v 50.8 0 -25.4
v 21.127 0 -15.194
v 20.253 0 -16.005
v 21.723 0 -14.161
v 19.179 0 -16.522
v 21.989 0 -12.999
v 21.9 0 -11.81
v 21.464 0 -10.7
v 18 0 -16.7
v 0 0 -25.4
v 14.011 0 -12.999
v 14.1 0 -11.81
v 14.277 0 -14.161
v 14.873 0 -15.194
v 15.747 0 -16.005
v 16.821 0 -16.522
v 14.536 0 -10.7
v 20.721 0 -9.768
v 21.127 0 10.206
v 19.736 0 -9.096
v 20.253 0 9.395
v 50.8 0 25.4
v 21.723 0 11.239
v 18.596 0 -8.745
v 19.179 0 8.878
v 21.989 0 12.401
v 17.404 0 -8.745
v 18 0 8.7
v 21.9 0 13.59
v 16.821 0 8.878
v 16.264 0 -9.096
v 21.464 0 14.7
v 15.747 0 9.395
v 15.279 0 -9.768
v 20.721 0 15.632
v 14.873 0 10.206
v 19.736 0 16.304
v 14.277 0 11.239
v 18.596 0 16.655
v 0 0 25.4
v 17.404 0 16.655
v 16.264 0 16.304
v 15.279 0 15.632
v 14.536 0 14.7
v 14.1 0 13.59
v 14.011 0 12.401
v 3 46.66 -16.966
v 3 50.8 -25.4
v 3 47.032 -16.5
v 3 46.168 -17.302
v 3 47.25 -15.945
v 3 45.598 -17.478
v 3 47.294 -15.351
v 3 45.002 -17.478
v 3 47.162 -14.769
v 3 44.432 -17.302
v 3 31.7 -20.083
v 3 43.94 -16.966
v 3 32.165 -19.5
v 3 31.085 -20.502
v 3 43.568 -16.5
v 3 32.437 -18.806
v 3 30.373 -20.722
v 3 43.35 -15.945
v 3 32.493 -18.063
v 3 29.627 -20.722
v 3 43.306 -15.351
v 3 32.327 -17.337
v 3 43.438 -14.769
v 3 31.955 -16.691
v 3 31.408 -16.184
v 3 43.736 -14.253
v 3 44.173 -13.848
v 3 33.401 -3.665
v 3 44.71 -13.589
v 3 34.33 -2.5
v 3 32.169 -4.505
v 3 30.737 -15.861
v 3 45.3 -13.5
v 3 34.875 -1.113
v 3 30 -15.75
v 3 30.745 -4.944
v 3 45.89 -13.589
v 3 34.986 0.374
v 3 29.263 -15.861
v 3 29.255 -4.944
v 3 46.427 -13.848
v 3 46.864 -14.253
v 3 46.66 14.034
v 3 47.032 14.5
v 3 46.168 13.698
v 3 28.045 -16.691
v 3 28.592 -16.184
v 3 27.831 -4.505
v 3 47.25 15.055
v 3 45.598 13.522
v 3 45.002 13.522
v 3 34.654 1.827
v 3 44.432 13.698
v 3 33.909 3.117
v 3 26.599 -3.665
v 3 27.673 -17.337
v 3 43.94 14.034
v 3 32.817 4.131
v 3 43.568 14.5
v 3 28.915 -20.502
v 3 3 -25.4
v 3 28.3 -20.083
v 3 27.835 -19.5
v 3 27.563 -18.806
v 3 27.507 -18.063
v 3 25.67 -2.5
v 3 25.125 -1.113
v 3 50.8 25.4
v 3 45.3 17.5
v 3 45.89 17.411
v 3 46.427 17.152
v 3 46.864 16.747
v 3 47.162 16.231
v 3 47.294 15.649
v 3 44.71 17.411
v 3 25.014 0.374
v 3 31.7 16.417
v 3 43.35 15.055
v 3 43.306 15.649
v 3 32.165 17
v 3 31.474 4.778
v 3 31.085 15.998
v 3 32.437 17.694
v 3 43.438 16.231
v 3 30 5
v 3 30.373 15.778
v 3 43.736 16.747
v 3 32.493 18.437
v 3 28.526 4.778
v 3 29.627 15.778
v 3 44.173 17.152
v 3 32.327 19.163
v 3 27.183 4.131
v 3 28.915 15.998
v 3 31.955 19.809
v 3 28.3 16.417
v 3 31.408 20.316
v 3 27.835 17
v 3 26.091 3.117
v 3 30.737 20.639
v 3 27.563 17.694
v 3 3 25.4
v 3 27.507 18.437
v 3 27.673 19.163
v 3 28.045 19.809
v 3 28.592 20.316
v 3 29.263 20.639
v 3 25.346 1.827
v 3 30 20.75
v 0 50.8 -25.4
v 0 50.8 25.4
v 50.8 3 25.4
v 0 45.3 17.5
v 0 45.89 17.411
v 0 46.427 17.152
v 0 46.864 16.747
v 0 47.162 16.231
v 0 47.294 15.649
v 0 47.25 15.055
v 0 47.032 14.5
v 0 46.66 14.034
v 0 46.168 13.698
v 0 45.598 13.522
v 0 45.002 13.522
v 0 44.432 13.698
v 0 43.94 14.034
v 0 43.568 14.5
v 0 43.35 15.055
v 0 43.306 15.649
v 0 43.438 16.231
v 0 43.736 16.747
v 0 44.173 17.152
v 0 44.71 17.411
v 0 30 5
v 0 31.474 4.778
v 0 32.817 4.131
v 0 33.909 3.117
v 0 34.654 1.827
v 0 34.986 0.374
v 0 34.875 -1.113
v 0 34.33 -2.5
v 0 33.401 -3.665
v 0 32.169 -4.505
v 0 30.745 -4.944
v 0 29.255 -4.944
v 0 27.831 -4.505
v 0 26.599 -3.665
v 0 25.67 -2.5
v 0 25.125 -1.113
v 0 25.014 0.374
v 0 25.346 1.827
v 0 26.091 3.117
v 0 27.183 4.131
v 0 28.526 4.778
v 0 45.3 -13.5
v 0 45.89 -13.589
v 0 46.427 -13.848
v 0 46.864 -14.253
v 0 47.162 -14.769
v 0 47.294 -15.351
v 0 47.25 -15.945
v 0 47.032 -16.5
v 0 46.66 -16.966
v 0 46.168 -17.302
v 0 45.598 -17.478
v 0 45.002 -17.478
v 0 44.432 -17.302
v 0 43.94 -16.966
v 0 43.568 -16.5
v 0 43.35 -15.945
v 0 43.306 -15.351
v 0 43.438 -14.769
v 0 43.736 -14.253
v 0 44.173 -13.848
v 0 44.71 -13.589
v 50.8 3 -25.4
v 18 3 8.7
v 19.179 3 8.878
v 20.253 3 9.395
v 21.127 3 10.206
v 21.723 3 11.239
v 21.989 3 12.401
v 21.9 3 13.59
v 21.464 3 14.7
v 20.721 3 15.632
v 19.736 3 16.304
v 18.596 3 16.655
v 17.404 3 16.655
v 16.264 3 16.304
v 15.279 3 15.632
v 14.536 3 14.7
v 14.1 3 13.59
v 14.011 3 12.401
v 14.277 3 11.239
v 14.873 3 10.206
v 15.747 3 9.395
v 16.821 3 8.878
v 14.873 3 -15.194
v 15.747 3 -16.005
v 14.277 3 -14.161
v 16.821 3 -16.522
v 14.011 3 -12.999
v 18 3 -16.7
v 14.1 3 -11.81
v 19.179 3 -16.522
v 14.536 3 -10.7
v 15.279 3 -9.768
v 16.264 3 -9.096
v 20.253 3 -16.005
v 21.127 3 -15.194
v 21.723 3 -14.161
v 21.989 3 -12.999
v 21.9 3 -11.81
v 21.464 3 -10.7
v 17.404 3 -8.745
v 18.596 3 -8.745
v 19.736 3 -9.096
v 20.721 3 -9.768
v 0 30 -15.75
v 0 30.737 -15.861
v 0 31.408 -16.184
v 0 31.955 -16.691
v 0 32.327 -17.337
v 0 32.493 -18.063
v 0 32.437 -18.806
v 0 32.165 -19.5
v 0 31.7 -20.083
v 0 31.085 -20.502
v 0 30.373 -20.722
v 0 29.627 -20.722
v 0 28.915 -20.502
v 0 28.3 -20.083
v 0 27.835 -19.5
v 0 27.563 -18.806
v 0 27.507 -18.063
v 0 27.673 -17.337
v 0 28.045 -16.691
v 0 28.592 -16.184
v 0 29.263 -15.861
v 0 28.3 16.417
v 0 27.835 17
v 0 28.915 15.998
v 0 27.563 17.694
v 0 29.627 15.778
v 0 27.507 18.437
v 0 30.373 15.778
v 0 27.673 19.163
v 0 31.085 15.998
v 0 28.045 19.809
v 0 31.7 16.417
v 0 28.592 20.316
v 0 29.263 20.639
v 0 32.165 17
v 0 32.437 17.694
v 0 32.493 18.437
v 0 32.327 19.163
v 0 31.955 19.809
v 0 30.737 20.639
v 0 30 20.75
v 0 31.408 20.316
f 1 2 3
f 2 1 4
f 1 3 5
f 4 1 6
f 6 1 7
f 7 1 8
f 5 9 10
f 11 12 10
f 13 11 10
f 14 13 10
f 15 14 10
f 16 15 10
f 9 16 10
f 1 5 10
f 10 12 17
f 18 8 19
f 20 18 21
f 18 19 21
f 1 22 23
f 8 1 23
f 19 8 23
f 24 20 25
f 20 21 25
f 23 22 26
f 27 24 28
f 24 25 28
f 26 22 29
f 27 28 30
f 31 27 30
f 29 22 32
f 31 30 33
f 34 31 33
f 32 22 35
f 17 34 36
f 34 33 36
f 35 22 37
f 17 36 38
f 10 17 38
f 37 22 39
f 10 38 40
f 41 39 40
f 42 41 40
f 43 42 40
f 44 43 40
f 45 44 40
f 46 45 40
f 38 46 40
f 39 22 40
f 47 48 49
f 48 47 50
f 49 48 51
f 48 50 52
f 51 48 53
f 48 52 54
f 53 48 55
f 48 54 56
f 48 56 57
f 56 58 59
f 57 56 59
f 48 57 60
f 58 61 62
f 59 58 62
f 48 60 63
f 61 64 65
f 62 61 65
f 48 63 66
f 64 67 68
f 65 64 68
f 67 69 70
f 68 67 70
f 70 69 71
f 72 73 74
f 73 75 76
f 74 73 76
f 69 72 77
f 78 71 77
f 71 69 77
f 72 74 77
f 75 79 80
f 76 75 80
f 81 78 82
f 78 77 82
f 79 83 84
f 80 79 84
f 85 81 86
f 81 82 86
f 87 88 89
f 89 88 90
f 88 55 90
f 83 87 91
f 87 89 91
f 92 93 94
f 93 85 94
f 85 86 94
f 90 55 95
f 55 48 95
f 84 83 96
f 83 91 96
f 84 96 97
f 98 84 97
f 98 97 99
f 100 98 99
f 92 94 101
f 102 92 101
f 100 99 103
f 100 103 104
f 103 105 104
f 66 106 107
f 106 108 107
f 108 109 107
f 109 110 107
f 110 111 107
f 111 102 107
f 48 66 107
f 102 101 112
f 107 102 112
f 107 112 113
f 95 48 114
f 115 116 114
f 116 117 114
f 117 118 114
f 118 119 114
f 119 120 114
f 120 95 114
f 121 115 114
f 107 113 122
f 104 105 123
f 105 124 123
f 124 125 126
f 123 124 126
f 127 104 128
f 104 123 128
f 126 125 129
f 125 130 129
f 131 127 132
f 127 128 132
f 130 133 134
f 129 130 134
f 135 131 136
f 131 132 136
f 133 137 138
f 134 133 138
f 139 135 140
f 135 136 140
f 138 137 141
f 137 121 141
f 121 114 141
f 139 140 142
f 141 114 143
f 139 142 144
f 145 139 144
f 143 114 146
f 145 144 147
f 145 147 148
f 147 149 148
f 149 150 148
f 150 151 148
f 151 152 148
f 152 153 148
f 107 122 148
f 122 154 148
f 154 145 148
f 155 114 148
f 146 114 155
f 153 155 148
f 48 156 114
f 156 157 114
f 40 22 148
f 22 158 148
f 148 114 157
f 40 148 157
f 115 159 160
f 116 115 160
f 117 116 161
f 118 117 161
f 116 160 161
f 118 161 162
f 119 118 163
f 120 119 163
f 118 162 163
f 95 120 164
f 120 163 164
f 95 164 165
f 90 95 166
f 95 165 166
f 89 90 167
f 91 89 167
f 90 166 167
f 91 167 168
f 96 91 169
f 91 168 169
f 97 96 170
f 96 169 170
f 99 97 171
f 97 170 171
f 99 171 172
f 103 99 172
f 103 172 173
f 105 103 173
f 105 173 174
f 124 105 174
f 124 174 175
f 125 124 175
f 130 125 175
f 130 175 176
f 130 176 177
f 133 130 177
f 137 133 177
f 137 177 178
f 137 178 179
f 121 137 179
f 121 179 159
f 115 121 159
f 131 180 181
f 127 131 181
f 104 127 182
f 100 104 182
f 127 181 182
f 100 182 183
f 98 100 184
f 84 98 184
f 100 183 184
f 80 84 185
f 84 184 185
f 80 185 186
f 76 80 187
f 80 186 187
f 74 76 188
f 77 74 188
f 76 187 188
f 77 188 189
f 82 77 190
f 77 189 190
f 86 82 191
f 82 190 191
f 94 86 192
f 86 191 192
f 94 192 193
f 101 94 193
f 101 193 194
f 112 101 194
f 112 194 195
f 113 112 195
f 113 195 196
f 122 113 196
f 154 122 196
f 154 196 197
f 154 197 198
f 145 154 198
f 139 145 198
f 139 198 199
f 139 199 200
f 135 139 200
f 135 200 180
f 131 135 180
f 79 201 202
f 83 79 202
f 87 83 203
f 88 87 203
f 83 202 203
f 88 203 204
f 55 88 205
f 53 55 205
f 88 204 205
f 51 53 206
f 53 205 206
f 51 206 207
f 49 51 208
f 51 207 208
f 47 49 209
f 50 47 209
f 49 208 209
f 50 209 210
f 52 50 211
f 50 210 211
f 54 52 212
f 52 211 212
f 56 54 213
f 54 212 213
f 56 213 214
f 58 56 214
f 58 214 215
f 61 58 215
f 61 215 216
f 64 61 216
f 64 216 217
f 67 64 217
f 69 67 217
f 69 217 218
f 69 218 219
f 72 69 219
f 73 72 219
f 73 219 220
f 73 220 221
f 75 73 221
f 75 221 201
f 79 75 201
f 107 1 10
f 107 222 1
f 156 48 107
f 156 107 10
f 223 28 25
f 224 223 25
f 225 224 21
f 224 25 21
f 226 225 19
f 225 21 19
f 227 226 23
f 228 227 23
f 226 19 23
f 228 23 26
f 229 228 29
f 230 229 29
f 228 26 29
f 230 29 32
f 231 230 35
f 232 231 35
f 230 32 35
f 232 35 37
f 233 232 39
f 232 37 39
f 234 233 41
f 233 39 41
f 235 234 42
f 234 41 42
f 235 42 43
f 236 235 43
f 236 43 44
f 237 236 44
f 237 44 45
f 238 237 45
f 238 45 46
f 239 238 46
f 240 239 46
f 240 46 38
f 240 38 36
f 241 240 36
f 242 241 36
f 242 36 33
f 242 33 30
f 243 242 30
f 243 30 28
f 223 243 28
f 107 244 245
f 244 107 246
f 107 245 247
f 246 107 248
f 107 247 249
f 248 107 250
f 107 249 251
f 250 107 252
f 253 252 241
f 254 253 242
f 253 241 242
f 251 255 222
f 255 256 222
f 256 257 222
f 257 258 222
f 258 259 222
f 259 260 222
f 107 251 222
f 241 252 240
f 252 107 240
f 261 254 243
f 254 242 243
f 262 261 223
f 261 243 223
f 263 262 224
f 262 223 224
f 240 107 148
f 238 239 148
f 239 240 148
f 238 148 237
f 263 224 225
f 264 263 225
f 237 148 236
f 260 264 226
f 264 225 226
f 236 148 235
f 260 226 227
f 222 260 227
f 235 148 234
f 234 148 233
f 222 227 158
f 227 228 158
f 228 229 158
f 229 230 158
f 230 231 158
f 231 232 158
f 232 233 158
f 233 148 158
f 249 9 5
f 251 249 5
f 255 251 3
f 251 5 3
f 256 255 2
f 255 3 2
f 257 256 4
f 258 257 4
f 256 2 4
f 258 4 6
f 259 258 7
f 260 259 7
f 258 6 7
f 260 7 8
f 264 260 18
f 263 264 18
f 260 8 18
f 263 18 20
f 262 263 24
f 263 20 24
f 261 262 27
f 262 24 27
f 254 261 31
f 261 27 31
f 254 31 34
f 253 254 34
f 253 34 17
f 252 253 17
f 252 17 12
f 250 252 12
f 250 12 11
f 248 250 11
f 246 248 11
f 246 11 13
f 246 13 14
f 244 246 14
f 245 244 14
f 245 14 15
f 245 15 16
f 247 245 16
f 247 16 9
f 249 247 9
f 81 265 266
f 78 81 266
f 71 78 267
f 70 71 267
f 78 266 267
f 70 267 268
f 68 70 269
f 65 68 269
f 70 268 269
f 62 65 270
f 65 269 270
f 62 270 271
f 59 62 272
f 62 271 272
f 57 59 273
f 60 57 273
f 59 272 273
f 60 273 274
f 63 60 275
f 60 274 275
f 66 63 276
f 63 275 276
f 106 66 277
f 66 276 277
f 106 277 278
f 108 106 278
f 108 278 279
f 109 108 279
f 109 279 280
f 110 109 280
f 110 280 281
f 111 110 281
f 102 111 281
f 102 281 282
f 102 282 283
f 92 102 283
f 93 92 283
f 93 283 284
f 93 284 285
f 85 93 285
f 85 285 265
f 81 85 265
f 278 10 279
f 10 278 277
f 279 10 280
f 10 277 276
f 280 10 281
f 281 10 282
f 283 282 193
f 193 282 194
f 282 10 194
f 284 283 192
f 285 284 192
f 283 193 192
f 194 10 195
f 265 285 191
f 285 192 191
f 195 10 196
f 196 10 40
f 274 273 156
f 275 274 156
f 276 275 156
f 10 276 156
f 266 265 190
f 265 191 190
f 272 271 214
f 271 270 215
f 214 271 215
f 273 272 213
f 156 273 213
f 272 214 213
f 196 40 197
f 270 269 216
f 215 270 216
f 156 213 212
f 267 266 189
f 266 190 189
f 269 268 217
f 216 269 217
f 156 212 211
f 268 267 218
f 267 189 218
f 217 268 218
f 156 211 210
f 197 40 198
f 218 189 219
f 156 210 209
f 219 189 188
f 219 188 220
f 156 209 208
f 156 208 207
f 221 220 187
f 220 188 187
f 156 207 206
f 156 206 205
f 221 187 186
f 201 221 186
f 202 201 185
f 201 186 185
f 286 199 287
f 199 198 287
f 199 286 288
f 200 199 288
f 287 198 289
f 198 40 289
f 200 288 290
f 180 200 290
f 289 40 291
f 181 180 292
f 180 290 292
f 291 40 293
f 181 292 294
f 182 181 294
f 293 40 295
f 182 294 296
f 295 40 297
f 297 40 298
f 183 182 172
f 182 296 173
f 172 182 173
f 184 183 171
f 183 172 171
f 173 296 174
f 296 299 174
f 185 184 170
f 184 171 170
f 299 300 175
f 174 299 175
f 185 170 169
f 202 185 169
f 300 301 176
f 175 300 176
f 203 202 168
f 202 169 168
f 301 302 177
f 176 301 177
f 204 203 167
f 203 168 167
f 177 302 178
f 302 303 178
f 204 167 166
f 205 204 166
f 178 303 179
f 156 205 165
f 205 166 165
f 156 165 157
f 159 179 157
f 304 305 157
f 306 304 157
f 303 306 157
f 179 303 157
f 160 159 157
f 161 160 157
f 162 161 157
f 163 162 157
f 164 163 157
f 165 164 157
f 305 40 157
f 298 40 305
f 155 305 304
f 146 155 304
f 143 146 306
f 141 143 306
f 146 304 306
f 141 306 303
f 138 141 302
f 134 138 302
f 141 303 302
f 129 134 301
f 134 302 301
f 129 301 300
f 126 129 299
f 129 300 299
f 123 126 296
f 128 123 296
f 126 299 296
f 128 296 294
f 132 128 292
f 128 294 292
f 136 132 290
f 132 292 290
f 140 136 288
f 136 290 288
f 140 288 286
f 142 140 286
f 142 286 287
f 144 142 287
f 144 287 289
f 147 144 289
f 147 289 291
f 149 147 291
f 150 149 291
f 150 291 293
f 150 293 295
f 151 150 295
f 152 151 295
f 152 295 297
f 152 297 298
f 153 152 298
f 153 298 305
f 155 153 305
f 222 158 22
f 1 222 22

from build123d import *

# Parameters (mm, degrees)
EXTRUDE_THIN1_DEPTH = 25.4
CUT_EXTRUDE1_REACH  = 78.2
SKETCH2_R           = 2.5
SKETCH2_R_2         = 5
CUT_EXTRUDE2_REACH  = 78.2
SKETCH3_R           = 4
CUT_EXTRUDE3_REACH  = 78.2
SKETCH4_R           = 2


with BuildPart() as part:
    # Sketch1 → Extrude-Thin1 (new, symmetric)
    with BuildSketch(Plane.XY):
        Polygon((50.8, 0), (0, 0), (0, 50.8), (3, 50.8), (3, 3), (50.8, 3), align=None)
    extrude(amount=EXTRUDE_THIN1_DEPTH, both=True)

    # Sketch2 → Cut-Extrude1 (cut, up to next)
    with BuildSketch(Plane.ZY, mode=Mode.PRIVATE) as cut_extrude1_sk1:
        with Locations((-18.25, 30)):
            Circle(SKETCH2_R)
    cut_extrude1_tool1 = extrude(cut_extrude1_sk1.sketch, amount=-CUT_EXTRUDE1_REACH, mode=Mode.PRIVATE) & part.part
    # Sketch2 → Cut-Extrude1 (cut, up to next)
    with BuildSketch(Plane.ZY, mode=Mode.PRIVATE) as cut_extrude1_sk2:
        with Locations((18.25, 30)):
            Circle(SKETCH2_R)
    cut_extrude1_tool2 = extrude(cut_extrude1_sk2.sketch, amount=-CUT_EXTRUDE1_REACH, mode=Mode.PRIVATE) & part.part
    # Sketch2 → Cut-Extrude1 (cut, up to next)
    with BuildSketch(Plane.ZY, mode=Mode.PRIVATE) as cut_extrude1_sk3:
        with Locations((0, 30)):
            Circle(SKETCH2_R_2)
    cut_extrude1_tool3 = extrude(cut_extrude1_sk3.sketch, amount=-CUT_EXTRUDE1_REACH, mode=Mode.PRIVATE) & part.part
    add(cut_extrude1_tool1.solids().sort_by_distance((0, 30, -18.25))[0], mode=Mode.SUBTRACT)
    add(cut_extrude1_tool2.solids().sort_by_distance((0, 30, 18.25))[0], mode=Mode.SUBTRACT)
    add(cut_extrude1_tool3.solids().sort_by_distance((0, 30, 0))[0], mode=Mode.SUBTRACT)

    # Sketch3 → Cut-Extrude2 (cut, up to next)
    with BuildSketch(Plane.XZ, mode=Mode.PRIVATE) as cut_extrude2_sk1:
        with Locations(Location((18, 12.7, 0), (0, 0, 270))):
            Circle(SKETCH3_R)
    cut_extrude2_tool1 = extrude(cut_extrude2_sk1.sketch, amount=-CUT_EXTRUDE2_REACH, mode=Mode.PRIVATE) & part.part
    # Sketch3 → Cut-Extrude2 (cut, up to next)
    with BuildSketch(Plane.XZ, mode=Mode.PRIVATE) as cut_extrude2_sk2:
        with Locations(Location((18, -12.7, 0), (0, 0, 270))):
            Circle(SKETCH3_R)
    cut_extrude2_tool2 = extrude(cut_extrude2_sk2.sketch, amount=-CUT_EXTRUDE2_REACH, mode=Mode.PRIVATE) & part.part
    add(cut_extrude2_tool1.solids().sort_by_distance((18, 0, 12.7))[0], mode=Mode.SUBTRACT)
    add(cut_extrude2_tool2.solids().sort_by_distance((18, 0, -12.7))[0], mode=Mode.SUBTRACT)

    # Sketch4 → Cut-Extrude3 (cut, up to next)
    with BuildSketch(Plane.ZY, mode=Mode.PRIVATE) as cut_extrude3_sk1:
        with Locations((-15.5, 45.3)):
            Circle(SKETCH4_R)
    cut_extrude3_tool1 = extrude(cut_extrude3_sk1.sketch, amount=-CUT_EXTRUDE3_REACH, mode=Mode.PRIVATE) & part.part
    # Sketch4 → Cut-Extrude3 (cut, up to next)
    with BuildSketch(Plane.ZY, mode=Mode.PRIVATE) as cut_extrude3_sk2:
        with Locations((15.5, 45.3)):
            Circle(SKETCH4_R)
    cut_extrude3_tool2 = extrude(cut_extrude3_sk2.sketch, amount=-CUT_EXTRUDE3_REACH, mode=Mode.PRIVATE) & part.part
    add(cut_extrude3_tool1.solids().sort_by_distance((0, 45.3, -15.5))[0], mode=Mode.SUBTRACT)
    add(cut_extrude3_tool2.solids().sort_by_distance((0, 45.3, 15.5))[0], mode=Mode.SUBTRACT)


solid = part.part
